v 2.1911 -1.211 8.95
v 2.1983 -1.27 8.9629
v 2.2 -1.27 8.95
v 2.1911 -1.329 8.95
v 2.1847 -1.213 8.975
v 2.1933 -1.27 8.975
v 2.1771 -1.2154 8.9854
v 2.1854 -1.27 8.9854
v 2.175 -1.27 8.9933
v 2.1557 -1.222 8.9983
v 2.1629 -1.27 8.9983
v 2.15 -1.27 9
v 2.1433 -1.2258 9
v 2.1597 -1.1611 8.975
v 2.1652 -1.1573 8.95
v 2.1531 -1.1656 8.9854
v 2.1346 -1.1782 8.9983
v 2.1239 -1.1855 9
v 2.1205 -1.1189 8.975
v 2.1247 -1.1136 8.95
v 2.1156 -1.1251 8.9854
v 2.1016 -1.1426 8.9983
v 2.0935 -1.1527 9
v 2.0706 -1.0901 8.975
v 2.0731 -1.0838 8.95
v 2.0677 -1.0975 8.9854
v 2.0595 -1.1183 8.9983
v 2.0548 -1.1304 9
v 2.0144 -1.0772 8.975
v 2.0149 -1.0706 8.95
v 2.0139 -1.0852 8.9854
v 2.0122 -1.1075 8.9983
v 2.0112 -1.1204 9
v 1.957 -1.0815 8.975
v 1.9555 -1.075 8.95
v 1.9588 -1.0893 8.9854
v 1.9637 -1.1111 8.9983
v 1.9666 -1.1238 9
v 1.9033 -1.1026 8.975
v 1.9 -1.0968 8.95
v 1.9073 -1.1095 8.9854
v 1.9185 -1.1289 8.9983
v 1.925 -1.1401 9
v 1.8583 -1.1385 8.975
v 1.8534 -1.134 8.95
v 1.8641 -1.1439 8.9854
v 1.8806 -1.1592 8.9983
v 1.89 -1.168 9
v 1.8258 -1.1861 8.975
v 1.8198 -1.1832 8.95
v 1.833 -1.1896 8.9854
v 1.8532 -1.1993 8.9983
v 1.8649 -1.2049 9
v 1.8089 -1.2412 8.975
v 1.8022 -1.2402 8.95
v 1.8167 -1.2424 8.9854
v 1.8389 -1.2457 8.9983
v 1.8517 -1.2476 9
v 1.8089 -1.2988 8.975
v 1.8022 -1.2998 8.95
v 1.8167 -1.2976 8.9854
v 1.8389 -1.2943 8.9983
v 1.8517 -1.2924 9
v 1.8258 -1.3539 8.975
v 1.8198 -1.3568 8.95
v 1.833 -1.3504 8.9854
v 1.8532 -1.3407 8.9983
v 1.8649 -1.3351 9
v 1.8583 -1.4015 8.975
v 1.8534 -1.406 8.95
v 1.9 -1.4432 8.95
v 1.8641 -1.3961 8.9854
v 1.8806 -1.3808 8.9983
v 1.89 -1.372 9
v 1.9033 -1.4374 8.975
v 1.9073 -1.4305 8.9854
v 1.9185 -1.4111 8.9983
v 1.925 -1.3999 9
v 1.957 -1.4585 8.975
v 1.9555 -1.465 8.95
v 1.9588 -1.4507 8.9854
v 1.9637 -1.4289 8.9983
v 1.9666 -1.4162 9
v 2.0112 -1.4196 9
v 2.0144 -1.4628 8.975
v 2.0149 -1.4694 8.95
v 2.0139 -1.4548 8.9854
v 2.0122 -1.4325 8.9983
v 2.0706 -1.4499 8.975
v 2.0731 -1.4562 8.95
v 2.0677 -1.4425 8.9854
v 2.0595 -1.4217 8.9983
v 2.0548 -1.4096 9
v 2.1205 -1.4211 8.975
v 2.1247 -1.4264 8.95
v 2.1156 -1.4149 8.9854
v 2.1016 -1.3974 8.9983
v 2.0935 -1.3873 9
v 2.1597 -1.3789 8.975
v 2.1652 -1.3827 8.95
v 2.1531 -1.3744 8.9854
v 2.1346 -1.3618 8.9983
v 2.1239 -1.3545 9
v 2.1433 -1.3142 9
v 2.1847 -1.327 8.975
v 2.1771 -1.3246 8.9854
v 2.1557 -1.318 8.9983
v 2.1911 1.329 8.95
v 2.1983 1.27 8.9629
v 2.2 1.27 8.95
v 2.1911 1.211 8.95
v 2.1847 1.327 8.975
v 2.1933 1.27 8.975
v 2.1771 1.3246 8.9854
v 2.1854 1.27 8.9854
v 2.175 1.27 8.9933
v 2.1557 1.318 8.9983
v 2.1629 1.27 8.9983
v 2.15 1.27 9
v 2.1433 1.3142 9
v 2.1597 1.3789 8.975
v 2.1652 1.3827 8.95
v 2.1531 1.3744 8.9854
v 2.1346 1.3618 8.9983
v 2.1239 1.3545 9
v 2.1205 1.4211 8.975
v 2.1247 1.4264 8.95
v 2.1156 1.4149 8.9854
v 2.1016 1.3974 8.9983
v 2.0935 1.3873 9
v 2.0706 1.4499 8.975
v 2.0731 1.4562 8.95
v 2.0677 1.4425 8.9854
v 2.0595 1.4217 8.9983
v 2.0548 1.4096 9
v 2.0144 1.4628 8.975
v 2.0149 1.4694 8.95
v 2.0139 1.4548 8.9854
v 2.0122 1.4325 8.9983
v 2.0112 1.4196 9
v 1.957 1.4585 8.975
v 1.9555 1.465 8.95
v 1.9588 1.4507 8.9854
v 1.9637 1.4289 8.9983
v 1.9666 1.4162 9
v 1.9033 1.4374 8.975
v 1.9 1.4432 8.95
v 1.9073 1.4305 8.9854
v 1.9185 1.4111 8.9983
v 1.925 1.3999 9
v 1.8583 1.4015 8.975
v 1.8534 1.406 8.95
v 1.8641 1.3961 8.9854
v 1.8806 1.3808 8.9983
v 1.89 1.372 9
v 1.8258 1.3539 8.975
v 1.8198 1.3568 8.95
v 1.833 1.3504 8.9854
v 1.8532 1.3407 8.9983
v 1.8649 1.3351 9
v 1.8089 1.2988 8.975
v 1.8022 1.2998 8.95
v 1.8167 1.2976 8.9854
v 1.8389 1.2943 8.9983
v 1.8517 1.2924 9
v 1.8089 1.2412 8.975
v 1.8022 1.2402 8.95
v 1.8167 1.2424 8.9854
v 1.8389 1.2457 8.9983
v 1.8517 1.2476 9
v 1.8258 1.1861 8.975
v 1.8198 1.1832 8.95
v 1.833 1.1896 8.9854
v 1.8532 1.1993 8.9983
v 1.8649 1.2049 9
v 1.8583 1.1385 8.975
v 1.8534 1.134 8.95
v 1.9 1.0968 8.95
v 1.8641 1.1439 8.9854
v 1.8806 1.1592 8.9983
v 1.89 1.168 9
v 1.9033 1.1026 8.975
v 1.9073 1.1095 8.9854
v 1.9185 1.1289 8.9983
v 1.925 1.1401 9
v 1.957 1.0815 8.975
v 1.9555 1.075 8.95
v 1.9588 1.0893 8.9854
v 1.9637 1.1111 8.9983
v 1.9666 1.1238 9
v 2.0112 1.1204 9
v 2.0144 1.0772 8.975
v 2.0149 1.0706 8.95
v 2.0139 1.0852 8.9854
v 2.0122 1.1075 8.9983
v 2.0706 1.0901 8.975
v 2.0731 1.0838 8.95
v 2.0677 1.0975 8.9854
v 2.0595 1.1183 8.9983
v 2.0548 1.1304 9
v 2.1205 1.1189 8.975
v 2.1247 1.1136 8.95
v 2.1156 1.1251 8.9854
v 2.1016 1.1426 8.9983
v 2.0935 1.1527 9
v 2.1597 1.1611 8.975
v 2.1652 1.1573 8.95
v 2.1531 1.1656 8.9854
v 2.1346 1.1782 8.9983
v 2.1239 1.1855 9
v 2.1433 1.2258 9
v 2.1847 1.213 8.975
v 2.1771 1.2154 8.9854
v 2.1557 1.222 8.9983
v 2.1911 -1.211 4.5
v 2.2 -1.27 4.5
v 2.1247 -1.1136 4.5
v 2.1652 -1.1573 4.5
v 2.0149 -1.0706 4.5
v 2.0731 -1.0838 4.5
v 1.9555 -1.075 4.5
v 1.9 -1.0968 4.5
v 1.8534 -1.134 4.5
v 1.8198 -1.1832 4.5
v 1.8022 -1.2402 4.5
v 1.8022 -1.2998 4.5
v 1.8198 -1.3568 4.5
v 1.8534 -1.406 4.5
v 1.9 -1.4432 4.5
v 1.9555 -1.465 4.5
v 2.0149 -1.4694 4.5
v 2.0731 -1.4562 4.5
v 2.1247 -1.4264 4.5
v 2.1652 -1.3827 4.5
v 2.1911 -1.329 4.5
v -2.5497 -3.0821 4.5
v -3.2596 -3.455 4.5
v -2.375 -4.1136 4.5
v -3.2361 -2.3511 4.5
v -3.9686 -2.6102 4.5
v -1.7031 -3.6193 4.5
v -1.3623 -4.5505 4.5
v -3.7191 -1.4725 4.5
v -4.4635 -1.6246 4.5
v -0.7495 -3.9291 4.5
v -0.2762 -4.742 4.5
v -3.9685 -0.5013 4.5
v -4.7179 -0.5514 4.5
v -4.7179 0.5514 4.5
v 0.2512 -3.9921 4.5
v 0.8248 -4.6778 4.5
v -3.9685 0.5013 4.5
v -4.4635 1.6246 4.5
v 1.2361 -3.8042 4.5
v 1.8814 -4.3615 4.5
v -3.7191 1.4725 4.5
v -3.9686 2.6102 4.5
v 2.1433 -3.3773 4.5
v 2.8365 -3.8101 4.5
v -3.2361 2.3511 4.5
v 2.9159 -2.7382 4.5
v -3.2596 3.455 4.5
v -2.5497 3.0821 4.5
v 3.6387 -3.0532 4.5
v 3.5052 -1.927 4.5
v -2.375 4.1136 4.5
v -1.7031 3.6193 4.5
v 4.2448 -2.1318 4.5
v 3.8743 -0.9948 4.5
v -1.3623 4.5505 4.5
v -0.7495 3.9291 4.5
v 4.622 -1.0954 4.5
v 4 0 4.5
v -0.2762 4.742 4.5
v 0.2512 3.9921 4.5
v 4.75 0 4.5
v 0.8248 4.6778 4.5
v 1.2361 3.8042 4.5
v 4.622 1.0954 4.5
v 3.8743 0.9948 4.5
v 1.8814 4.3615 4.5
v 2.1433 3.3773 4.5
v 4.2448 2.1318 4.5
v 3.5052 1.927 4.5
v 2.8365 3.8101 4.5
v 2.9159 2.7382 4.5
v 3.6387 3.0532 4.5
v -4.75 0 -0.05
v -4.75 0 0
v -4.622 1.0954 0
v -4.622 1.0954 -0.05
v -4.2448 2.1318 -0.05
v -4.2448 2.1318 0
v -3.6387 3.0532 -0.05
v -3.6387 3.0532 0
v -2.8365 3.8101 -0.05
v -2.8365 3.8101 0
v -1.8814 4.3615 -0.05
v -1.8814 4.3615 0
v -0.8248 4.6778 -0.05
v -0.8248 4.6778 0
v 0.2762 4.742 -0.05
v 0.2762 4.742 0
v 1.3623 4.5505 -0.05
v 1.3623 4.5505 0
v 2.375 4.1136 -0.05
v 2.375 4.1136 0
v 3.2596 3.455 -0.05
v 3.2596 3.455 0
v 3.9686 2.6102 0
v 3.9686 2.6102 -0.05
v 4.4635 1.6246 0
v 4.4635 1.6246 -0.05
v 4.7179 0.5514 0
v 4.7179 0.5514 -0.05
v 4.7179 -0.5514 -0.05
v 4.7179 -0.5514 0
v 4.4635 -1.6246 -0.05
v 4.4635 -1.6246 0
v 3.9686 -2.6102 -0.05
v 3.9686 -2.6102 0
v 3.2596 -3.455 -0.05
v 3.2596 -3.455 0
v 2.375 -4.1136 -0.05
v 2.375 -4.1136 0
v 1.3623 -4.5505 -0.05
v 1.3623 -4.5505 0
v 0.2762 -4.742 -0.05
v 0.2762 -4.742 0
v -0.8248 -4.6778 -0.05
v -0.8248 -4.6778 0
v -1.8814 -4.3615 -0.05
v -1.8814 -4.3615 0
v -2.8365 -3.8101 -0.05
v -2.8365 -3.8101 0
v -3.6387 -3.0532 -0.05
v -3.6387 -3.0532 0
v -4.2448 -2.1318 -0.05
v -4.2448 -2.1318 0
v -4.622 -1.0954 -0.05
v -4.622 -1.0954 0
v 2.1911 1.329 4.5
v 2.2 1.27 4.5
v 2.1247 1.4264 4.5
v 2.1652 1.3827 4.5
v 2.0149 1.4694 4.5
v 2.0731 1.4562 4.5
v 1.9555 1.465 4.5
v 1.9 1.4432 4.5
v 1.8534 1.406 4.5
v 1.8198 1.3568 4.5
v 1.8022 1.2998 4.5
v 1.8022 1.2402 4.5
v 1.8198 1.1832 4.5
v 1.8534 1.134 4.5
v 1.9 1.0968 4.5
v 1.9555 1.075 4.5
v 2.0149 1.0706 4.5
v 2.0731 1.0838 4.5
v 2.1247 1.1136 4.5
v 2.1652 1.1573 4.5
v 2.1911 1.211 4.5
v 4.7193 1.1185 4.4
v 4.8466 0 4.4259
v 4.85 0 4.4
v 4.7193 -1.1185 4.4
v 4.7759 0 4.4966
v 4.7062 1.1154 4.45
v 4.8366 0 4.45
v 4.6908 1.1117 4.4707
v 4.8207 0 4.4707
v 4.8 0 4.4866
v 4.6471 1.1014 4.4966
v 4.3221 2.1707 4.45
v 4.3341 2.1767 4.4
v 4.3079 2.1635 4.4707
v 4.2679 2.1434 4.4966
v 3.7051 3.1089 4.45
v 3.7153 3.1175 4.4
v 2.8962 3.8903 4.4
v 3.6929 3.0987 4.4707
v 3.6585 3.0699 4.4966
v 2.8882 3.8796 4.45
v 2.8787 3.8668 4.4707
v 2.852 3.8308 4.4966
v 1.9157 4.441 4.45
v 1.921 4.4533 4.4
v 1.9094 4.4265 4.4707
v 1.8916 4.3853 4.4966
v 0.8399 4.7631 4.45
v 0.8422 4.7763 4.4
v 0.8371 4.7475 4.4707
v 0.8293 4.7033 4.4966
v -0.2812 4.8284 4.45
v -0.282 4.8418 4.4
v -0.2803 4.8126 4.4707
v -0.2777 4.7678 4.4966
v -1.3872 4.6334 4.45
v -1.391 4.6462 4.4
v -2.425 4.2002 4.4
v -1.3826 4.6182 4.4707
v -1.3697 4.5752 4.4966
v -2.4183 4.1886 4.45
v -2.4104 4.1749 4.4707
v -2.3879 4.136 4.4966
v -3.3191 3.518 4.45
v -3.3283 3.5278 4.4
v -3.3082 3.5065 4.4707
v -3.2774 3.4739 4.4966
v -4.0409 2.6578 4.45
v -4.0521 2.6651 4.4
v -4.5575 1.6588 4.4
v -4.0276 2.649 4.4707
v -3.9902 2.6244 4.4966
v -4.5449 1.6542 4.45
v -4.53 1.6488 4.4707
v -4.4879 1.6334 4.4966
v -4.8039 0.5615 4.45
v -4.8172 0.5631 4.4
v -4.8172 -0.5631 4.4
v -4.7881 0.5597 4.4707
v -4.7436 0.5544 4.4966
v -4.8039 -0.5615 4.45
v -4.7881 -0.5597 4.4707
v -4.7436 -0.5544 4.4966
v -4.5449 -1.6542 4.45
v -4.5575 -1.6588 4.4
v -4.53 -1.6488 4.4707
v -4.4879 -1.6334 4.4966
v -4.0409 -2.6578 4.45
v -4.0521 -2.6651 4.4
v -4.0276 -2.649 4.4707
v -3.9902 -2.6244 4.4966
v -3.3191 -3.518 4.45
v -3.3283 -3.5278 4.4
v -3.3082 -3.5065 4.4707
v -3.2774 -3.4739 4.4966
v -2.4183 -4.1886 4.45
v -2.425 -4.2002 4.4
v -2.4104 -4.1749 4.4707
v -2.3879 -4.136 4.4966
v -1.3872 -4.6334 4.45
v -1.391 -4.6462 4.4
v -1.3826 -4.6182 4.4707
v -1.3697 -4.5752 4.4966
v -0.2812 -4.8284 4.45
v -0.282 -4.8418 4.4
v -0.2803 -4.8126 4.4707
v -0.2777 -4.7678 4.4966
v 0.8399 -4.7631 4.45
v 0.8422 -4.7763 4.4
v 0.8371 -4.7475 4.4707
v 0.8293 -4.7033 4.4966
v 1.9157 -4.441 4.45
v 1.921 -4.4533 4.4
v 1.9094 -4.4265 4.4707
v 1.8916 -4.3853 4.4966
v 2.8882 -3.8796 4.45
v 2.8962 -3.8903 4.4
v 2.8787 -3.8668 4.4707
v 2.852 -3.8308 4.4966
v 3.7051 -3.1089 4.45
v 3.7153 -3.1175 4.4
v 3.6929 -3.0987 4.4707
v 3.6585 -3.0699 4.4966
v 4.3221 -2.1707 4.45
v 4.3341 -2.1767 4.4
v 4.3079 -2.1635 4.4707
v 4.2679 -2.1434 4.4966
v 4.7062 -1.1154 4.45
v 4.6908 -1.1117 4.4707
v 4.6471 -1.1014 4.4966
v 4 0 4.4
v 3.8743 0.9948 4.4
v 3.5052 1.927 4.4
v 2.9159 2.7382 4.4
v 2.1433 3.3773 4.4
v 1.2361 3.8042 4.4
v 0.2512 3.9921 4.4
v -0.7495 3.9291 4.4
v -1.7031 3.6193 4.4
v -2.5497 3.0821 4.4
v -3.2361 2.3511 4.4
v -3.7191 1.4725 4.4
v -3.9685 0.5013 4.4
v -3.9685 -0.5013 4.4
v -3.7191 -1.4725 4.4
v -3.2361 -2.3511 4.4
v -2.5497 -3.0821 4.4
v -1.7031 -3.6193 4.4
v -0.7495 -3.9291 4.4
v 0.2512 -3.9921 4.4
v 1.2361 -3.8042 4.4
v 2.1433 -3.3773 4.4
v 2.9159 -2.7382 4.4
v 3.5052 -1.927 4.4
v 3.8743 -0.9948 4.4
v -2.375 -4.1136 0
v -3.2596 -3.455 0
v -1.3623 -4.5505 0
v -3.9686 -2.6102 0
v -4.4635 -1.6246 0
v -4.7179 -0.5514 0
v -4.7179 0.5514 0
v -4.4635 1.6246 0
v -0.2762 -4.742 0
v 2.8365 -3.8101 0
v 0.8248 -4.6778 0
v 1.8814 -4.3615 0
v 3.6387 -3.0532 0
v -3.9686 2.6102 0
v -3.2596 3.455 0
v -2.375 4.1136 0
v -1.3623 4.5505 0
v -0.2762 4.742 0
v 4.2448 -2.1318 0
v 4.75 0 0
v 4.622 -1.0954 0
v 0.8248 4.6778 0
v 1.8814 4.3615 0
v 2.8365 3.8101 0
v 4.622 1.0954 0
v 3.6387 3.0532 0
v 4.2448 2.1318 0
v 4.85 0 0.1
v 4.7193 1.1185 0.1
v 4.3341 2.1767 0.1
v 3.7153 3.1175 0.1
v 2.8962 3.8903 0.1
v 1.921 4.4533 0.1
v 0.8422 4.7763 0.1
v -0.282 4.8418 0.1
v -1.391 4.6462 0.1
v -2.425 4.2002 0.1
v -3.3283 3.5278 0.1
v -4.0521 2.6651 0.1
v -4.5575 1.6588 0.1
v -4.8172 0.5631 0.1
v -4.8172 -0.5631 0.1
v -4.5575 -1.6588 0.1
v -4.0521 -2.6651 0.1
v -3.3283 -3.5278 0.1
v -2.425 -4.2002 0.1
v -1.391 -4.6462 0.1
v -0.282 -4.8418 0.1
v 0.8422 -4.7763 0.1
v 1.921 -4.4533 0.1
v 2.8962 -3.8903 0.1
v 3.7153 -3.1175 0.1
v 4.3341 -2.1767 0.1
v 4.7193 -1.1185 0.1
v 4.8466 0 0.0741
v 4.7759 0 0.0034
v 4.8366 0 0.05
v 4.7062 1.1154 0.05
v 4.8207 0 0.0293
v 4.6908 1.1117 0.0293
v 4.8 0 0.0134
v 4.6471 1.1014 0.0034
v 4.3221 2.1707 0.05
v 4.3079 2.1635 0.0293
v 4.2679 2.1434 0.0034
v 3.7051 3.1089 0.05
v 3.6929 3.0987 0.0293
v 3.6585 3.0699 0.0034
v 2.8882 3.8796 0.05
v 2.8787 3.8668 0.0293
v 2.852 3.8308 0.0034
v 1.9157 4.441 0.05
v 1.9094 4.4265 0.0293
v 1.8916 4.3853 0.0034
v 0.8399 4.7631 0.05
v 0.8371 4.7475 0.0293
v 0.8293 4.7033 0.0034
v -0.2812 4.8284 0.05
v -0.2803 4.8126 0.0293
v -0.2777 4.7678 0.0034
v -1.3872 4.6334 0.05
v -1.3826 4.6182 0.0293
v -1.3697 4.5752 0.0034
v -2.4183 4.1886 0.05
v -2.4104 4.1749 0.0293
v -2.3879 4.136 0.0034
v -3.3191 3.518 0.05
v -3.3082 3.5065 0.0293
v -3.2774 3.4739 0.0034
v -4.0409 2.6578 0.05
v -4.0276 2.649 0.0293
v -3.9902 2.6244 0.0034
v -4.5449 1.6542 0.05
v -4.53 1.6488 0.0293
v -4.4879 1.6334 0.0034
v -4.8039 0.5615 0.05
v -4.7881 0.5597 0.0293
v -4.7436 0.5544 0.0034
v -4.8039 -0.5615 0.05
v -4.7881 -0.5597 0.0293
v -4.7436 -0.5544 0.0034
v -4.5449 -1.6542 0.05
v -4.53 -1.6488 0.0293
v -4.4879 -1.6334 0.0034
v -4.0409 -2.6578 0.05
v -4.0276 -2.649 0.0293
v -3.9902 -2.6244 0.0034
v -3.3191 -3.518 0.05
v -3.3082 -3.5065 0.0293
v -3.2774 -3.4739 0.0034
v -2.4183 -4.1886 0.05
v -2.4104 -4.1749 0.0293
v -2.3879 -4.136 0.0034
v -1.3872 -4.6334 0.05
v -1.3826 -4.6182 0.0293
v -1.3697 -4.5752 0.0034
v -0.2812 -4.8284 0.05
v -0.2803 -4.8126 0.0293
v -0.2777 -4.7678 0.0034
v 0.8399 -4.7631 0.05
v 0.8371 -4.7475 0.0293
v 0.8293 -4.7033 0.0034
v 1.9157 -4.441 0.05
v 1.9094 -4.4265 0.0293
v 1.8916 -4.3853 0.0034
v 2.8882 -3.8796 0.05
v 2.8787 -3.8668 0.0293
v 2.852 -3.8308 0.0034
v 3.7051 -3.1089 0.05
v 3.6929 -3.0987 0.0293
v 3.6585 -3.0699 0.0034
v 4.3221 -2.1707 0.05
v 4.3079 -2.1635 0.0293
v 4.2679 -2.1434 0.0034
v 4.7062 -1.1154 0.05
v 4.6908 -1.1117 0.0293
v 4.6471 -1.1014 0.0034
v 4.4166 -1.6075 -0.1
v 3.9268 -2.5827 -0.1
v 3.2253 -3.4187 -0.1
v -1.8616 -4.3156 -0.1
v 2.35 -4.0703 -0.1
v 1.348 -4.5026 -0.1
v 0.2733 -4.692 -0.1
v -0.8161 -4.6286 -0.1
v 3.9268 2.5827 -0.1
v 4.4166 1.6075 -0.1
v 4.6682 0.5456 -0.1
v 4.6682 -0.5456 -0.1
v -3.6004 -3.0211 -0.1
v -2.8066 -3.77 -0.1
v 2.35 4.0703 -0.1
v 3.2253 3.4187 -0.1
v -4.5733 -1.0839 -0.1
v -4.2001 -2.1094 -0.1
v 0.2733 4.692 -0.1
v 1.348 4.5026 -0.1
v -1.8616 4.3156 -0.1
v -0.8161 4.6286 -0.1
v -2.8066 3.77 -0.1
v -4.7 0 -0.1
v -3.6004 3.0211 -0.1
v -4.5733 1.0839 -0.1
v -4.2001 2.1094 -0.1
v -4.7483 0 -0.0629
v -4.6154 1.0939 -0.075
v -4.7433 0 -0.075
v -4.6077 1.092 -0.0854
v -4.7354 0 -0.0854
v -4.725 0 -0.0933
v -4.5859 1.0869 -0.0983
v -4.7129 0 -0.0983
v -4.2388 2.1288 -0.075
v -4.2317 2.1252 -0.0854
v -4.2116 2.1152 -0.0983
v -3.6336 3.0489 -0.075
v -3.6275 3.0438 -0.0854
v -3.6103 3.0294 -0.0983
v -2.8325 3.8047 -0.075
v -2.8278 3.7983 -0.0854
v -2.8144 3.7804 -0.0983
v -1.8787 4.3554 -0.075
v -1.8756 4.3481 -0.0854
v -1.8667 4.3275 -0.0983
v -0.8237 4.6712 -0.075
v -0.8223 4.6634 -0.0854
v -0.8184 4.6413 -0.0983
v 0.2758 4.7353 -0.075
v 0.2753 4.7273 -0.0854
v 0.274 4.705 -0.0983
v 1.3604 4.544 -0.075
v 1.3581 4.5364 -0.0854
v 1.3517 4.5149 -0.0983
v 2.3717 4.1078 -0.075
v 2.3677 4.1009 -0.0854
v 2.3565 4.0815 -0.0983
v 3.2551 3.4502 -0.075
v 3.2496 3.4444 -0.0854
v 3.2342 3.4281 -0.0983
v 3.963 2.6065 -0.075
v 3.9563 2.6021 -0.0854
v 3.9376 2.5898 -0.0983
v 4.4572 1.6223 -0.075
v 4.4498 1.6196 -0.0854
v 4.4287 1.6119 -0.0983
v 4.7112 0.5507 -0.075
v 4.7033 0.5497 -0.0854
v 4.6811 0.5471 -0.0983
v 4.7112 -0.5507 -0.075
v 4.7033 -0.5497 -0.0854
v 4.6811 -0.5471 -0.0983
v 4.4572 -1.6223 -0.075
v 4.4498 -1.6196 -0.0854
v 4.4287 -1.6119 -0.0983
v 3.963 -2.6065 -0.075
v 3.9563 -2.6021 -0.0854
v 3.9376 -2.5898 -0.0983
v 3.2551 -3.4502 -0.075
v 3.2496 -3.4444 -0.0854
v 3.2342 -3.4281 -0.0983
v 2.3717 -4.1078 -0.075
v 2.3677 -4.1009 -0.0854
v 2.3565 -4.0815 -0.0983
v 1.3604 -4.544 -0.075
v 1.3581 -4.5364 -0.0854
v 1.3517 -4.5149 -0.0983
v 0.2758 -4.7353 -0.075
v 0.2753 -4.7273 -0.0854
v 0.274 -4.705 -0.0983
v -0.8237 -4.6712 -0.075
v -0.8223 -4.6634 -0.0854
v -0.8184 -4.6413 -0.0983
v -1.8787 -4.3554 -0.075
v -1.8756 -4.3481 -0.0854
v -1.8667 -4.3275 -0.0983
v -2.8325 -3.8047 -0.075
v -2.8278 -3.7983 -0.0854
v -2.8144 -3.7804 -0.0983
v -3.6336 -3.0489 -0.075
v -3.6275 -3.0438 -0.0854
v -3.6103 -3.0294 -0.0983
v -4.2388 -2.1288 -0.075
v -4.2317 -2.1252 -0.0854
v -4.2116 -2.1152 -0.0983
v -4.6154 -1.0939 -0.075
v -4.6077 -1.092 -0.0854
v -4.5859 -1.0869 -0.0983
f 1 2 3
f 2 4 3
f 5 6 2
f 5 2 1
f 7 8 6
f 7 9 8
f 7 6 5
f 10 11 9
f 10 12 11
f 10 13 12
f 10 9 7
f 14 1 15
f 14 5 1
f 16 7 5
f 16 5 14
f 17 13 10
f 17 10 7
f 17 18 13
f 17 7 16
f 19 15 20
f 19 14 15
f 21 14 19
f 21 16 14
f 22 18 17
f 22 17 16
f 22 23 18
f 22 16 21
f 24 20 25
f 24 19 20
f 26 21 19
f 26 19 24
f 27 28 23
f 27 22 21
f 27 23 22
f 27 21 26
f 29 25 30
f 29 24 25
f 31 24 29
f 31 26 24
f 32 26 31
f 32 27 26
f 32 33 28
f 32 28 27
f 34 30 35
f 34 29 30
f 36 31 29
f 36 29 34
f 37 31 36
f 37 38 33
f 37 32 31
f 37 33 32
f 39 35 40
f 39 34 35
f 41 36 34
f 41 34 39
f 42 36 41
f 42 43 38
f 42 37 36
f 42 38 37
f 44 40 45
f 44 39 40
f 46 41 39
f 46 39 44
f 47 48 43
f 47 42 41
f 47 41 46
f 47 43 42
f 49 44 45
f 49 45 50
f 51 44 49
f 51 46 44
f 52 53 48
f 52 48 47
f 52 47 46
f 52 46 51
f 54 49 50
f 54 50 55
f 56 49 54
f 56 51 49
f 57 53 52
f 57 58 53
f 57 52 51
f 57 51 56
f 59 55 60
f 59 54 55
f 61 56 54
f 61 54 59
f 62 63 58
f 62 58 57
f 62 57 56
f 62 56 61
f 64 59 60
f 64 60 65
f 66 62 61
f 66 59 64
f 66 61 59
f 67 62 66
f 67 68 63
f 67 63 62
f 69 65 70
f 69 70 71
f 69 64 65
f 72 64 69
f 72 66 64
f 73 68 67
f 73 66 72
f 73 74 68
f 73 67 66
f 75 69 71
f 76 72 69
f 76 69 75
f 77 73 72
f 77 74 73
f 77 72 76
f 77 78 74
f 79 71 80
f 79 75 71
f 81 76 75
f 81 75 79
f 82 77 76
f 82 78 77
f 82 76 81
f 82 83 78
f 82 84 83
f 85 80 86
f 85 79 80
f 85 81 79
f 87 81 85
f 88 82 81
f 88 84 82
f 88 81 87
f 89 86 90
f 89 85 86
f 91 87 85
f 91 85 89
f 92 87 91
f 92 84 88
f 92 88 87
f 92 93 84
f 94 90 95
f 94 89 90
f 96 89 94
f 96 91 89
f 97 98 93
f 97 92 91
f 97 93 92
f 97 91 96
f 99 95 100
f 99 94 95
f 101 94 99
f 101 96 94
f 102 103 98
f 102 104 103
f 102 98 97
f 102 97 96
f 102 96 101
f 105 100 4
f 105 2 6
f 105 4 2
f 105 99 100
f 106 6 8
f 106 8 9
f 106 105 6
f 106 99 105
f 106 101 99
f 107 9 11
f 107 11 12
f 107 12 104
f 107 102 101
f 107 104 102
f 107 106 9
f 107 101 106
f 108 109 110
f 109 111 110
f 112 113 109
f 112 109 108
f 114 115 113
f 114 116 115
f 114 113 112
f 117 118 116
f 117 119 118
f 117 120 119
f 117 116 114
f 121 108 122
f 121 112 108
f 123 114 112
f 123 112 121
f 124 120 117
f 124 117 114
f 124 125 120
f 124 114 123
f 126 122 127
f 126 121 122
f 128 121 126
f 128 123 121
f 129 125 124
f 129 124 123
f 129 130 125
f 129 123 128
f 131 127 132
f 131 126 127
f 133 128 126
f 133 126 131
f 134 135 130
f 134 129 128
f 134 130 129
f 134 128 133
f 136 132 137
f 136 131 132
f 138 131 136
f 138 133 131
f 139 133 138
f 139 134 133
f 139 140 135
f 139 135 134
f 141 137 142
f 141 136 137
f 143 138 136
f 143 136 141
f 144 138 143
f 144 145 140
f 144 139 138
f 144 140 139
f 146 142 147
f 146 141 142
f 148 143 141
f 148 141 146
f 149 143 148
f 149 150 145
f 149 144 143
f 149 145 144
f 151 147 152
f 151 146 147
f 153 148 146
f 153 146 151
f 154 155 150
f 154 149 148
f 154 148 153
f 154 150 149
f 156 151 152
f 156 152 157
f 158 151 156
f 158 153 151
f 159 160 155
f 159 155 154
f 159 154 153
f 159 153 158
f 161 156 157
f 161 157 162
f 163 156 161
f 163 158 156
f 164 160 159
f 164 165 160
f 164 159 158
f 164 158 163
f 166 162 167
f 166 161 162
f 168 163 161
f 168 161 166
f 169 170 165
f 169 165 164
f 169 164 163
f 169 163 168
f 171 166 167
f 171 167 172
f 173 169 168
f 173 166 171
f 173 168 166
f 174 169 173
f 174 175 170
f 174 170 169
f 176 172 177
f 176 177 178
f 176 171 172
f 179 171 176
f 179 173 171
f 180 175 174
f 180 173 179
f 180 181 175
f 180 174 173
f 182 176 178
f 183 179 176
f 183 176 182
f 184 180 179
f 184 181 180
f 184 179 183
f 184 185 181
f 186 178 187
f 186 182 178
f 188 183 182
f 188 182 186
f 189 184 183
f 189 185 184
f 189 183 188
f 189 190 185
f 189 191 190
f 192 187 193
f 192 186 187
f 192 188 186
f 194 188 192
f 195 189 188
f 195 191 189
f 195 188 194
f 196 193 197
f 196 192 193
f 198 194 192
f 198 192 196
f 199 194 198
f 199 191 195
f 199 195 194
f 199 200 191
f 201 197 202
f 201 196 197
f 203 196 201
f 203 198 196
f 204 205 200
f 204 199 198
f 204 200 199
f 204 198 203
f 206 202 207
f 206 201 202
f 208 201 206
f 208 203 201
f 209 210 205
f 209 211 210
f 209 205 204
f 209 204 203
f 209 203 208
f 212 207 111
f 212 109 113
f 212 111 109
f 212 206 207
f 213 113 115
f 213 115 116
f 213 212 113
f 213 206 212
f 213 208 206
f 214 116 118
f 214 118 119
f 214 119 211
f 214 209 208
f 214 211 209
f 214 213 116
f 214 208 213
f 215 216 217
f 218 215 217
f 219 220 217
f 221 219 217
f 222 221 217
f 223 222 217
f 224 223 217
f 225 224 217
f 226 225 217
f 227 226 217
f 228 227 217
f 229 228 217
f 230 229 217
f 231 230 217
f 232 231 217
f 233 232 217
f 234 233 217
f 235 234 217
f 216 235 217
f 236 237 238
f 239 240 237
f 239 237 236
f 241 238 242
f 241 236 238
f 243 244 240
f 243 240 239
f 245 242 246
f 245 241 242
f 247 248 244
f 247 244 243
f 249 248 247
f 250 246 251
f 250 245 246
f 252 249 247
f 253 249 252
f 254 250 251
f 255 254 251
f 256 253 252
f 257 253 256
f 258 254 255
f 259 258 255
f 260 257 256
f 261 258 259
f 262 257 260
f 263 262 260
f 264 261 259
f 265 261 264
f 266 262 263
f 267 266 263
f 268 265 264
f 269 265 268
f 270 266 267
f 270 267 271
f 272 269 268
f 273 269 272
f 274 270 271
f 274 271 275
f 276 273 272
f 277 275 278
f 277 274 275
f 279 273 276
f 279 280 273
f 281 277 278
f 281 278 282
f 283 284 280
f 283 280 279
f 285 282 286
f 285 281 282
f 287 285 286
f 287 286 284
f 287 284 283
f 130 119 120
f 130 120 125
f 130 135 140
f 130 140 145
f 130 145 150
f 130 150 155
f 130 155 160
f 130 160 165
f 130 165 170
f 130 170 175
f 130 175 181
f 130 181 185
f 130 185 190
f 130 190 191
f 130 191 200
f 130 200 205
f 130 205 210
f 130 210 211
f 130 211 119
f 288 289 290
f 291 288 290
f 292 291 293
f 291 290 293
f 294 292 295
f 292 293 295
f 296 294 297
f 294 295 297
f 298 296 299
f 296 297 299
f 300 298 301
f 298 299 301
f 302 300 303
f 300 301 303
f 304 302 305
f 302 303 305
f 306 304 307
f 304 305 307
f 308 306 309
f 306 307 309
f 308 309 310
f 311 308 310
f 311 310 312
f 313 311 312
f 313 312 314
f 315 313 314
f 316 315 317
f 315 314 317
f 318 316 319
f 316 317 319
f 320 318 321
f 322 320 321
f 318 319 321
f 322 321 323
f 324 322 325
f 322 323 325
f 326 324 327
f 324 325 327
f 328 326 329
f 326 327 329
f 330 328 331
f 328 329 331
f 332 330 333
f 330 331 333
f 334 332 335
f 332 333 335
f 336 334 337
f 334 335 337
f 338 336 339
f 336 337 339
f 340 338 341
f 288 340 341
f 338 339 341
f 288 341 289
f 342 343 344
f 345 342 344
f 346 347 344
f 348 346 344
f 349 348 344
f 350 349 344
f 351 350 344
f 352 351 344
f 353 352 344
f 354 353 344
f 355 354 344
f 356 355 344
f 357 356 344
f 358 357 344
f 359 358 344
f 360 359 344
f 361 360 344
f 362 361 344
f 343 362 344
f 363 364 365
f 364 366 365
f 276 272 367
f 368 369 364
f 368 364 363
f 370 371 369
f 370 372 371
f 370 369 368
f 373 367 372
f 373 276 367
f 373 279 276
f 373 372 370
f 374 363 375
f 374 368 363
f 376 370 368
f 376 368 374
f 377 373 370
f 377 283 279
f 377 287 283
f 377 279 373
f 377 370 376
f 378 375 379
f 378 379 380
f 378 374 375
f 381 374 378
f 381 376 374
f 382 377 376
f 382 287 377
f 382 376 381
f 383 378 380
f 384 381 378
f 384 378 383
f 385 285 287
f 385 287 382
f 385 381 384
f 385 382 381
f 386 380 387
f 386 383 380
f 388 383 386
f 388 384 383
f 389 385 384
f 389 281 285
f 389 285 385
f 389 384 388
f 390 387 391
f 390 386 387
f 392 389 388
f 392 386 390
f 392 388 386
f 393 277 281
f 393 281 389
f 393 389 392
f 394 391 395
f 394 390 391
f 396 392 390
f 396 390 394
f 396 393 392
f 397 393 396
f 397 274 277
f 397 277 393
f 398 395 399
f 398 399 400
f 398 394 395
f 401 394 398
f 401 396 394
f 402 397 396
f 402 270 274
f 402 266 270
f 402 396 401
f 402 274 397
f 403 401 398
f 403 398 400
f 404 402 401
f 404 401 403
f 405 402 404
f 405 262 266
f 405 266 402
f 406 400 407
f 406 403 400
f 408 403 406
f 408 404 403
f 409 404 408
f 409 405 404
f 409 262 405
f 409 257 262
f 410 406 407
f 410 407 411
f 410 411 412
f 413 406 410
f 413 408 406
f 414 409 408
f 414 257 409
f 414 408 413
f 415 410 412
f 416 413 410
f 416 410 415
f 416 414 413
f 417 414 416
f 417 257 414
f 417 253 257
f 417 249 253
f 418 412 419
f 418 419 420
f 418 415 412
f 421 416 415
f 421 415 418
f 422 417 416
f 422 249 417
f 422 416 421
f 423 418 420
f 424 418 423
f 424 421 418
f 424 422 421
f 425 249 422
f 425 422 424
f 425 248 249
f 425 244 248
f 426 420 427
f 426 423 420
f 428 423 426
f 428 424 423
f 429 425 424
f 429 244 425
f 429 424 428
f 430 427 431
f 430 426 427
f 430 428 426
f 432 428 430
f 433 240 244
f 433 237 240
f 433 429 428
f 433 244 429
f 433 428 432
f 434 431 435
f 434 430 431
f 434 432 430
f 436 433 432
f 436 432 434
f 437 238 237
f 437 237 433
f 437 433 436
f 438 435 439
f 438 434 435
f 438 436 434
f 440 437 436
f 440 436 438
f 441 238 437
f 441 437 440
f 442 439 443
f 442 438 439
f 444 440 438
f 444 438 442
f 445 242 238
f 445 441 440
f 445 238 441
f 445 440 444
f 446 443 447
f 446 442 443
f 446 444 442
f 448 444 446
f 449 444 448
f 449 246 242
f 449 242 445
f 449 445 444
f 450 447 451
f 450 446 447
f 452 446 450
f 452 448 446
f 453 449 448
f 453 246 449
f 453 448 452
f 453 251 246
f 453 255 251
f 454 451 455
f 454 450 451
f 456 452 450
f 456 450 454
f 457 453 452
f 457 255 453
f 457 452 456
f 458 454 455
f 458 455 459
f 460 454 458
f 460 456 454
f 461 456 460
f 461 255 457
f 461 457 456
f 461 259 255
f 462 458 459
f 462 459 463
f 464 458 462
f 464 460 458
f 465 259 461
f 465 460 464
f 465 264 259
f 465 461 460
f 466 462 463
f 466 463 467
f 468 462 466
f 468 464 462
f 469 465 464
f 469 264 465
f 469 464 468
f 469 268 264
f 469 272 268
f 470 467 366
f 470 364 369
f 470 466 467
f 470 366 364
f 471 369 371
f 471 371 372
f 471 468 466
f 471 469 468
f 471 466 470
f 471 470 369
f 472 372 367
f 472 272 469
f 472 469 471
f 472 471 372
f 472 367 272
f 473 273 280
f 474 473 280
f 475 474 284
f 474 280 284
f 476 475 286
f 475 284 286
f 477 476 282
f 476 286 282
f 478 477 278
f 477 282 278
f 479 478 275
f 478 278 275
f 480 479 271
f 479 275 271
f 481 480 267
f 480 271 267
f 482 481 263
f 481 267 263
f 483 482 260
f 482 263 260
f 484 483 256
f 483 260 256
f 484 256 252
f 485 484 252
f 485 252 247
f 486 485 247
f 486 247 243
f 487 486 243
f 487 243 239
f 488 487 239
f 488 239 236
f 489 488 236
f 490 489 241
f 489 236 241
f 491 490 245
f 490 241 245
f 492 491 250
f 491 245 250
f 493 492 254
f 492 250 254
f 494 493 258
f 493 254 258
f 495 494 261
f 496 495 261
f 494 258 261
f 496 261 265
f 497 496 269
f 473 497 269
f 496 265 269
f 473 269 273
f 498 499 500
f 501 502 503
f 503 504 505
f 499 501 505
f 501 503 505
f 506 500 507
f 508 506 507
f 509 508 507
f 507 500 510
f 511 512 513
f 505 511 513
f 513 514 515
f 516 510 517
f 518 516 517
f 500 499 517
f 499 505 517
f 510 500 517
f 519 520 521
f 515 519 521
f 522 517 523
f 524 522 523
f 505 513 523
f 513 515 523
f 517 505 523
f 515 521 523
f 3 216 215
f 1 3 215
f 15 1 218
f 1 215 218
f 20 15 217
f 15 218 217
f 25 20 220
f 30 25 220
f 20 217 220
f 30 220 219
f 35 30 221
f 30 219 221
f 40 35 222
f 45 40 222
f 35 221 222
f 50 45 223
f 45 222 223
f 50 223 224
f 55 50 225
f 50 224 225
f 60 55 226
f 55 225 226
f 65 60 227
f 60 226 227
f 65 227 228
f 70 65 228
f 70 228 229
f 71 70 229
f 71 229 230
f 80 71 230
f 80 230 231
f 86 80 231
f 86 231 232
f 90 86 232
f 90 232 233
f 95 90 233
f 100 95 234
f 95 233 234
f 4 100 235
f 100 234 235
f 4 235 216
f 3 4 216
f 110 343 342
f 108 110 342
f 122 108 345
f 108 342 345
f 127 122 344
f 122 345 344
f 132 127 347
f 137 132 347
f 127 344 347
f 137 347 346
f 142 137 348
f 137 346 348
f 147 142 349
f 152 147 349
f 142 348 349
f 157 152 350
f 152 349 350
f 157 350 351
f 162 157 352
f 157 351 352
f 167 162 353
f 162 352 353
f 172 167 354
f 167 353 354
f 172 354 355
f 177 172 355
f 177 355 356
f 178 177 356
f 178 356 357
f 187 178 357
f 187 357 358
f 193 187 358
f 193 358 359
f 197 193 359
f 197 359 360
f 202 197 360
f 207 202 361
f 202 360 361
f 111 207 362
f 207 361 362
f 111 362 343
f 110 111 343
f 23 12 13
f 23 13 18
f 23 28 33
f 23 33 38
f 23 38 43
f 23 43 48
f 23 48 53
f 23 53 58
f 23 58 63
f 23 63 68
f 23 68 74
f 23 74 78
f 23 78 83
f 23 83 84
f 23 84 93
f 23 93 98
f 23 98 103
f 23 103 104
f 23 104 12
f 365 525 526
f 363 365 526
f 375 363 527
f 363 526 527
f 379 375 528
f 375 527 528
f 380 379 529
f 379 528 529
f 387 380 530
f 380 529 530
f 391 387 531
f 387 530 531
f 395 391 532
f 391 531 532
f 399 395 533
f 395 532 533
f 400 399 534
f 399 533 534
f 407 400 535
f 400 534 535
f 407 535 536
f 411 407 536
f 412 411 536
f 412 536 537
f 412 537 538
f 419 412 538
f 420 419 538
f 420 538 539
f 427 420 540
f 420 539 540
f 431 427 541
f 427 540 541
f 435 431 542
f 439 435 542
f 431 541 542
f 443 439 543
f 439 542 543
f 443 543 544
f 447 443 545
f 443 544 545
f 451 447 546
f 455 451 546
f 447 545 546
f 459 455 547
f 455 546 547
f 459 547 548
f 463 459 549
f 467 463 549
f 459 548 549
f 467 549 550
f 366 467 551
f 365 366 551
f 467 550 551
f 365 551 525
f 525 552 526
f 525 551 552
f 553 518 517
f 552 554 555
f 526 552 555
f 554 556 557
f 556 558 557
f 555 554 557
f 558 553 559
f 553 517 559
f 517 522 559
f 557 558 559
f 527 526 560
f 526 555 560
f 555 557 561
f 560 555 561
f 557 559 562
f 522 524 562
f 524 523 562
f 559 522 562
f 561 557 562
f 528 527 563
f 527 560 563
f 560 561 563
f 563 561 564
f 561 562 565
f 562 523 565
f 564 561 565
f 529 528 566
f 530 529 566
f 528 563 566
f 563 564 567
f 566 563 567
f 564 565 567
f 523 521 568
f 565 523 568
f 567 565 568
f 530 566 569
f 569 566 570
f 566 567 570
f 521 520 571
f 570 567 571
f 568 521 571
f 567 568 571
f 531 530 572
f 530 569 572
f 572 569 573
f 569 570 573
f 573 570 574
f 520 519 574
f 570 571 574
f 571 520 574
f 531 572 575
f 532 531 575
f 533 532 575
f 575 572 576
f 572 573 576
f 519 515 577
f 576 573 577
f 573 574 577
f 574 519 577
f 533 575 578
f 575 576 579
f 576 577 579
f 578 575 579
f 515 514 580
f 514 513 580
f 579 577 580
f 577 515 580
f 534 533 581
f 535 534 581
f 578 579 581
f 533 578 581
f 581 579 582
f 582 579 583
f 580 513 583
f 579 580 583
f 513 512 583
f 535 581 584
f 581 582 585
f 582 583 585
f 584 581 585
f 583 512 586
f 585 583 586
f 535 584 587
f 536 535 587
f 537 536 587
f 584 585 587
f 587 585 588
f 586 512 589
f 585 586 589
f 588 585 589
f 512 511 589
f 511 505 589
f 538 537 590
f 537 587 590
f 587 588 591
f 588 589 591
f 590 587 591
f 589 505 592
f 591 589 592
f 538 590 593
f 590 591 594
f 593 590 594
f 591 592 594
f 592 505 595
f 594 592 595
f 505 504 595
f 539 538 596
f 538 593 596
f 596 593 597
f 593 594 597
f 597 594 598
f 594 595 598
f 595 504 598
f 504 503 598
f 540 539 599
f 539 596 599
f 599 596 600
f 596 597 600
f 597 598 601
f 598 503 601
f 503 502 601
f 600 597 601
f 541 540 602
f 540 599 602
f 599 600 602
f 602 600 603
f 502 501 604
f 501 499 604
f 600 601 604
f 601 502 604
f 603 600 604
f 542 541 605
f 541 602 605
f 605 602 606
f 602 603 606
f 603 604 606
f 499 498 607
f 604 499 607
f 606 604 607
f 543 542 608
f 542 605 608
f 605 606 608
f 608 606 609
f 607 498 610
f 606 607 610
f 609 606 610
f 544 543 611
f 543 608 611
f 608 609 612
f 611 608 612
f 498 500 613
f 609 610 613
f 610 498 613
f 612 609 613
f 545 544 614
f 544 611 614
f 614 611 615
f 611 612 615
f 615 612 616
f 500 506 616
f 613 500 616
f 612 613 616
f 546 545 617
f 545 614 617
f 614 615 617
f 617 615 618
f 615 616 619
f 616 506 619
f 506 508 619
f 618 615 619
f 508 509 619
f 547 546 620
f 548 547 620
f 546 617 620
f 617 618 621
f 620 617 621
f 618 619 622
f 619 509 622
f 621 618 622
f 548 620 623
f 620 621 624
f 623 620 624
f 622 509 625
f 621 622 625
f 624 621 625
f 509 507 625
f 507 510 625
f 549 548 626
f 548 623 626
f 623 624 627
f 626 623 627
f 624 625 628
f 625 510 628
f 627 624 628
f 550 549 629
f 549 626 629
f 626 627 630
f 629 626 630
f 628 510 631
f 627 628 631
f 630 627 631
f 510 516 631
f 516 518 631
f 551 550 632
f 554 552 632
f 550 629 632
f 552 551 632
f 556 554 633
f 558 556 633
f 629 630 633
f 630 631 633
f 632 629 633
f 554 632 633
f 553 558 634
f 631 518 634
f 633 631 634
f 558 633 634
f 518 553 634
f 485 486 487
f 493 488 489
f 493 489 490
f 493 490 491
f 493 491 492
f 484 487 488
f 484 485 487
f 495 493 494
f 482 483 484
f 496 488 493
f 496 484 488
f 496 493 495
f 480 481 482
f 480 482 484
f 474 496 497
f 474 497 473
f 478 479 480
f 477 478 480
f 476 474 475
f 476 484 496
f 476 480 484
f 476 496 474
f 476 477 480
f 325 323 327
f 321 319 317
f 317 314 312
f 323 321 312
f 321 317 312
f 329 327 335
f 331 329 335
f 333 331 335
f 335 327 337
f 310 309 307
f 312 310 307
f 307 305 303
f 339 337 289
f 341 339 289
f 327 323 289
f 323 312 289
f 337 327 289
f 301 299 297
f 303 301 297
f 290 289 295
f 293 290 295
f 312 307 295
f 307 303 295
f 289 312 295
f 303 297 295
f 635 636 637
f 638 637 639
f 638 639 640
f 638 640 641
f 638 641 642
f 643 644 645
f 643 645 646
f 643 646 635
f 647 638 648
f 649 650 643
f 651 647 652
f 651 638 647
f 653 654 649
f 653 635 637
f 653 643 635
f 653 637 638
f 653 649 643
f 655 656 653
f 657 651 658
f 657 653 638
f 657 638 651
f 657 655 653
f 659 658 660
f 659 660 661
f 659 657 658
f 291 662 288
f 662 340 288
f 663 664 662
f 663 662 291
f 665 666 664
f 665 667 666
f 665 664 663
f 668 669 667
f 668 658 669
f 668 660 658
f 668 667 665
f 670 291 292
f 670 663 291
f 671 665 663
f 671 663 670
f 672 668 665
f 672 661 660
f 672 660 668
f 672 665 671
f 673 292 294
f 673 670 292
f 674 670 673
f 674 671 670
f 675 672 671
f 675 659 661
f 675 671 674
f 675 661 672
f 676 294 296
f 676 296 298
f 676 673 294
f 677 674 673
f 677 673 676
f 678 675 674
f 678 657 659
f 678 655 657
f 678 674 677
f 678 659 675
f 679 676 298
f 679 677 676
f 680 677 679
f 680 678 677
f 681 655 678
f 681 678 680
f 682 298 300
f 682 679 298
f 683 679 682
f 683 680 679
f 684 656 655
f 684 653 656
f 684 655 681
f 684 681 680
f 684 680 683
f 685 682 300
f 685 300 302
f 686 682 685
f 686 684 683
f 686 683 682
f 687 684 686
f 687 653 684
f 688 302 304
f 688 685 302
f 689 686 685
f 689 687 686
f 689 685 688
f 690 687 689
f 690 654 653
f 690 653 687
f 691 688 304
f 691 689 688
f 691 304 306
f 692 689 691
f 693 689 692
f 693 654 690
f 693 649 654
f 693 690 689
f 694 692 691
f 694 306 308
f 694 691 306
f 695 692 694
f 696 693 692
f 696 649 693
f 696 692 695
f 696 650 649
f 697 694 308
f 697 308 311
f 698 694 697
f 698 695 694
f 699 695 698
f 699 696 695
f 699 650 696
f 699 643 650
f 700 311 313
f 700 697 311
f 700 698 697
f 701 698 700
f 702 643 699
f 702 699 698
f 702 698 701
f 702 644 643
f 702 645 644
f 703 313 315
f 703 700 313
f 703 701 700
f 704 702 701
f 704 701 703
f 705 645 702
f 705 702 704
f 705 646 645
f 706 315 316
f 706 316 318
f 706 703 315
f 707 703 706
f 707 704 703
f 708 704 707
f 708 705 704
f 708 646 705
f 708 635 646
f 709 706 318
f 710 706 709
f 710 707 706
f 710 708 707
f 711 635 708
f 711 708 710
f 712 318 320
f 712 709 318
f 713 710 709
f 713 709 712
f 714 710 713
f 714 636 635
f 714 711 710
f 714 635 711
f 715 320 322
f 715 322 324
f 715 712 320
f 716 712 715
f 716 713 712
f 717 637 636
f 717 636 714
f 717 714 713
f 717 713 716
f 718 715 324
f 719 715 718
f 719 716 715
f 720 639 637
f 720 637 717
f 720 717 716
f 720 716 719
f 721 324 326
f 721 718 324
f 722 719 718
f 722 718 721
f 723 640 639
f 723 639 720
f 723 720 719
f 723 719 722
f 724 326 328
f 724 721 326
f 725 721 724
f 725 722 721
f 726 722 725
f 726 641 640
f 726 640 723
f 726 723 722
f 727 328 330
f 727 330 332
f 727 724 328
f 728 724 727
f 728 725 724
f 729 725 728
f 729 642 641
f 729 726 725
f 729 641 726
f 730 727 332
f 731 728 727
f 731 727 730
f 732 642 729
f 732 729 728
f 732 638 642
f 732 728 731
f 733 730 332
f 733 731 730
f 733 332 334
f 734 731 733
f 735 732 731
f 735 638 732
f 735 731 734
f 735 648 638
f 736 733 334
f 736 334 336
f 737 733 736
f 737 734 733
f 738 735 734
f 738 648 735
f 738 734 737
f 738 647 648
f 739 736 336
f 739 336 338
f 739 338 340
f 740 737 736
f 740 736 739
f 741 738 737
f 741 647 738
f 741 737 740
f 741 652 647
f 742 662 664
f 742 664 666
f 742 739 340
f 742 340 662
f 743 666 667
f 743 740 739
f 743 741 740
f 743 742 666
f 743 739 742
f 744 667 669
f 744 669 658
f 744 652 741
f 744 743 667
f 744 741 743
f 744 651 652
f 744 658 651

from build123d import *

# Parameters (mm, degrees)
SKETCH1_R             = 4.85
BOSS_EXTRUDE1_DEPTH   = 4.5
SKETCH3_R             = 0.2
BOSS_EXTRUDE2_DEPTH   = 4.5
BOSS_EXTRUDE2_2_DEPTH = 4.5
FILLET1_R             = 0.1
SKETCH4_R             = 4.75
BOSS_EXTRUDE3_DEPTH   = 0.1
FILLET2_R             = 0.05
SKETCH6_R             = 4
CUT_EXTRUDE1_DEPTH    = 0.1
FILLET3_R             = 0.05
FILLET4_R             = 0.05


with BuildPart() as part:
    # Sketch1 → Boss-Extrude1 (new body)
    with BuildSketch(Plane.XY):
        Circle(SKETCH1_R)
    extrude(amount=BOSS_EXTRUDE1_DEPTH)

    # Fillet1
    fillet1_edges = [part.edges().sort_by_distance(p)[0] for p in [
        (-4.85, 0, 0),
        (-4.85, 0, 4.5),
    ]]
    fillet(fillet1_edges, radius=FILLET1_R)

    # Sketch6 → Cut-Extrude1 (cut)
    with BuildSketch(Plane.XY.offset(4.5)):
        Circle(SKETCH6_R)
    extrude(amount=-CUT_EXTRUDE1_DEPTH, mode=Mode.SUBTRACT)


with BuildPart() as body_2:
    # Sketch3 → Boss-Extrude2 (new body)
    with BuildSketch(Plane.XY.offset(4.5)):
        with Locations((2, -1.27)):
            Circle(SKETCH3_R)
    extrude(amount=BOSS_EXTRUDE2_DEPTH)

    # Fillet3
    fillet3_edges = [body_2.edges().sort_by_distance(p)[0] for p in [
        (1.8, -1.27, 9),
    ]]
    fillet(fillet3_edges, radius=FILLET3_R)


with BuildPart() as body_3:
    # Sketch3 → Boss-Extrude2 2 (new body)
    with BuildSketch(Plane.XY.offset(4.5)):
        with Locations((2, 1.27)):
            Circle(SKETCH3_R)
    extrude(amount=BOSS_EXTRUDE2_2_DEPTH)

    # Fillet4
    fillet4_edges = [body_3.edges().sort_by_distance(p)[0] for p in [
        (1.8, 1.27, 9),
    ]]
    fillet(fillet4_edges, radius=FILLET4_R)


with BuildPart() as body_4:
    # Sketch4 → Boss-Extrude3 (new body)
    with BuildSketch(Plane(origin=(0, 0, 0), x_dir=(-1, 0, 0), z_dir=(0, 0, -1))):
        Circle(SKETCH4_R)
    extrude(amount=BOSS_EXTRUDE3_DEPTH)

    # Fillet2
    fillet2_edges = [body_4.edges().sort_by_distance(p)[0] for p in [
        (4.75, 0, -0.1),
    ]]
    fillet(fillet2_edges, radius=FILLET2_R)


solid = Compound([part.part, body_2.part, body_3.part, body_4.part])
